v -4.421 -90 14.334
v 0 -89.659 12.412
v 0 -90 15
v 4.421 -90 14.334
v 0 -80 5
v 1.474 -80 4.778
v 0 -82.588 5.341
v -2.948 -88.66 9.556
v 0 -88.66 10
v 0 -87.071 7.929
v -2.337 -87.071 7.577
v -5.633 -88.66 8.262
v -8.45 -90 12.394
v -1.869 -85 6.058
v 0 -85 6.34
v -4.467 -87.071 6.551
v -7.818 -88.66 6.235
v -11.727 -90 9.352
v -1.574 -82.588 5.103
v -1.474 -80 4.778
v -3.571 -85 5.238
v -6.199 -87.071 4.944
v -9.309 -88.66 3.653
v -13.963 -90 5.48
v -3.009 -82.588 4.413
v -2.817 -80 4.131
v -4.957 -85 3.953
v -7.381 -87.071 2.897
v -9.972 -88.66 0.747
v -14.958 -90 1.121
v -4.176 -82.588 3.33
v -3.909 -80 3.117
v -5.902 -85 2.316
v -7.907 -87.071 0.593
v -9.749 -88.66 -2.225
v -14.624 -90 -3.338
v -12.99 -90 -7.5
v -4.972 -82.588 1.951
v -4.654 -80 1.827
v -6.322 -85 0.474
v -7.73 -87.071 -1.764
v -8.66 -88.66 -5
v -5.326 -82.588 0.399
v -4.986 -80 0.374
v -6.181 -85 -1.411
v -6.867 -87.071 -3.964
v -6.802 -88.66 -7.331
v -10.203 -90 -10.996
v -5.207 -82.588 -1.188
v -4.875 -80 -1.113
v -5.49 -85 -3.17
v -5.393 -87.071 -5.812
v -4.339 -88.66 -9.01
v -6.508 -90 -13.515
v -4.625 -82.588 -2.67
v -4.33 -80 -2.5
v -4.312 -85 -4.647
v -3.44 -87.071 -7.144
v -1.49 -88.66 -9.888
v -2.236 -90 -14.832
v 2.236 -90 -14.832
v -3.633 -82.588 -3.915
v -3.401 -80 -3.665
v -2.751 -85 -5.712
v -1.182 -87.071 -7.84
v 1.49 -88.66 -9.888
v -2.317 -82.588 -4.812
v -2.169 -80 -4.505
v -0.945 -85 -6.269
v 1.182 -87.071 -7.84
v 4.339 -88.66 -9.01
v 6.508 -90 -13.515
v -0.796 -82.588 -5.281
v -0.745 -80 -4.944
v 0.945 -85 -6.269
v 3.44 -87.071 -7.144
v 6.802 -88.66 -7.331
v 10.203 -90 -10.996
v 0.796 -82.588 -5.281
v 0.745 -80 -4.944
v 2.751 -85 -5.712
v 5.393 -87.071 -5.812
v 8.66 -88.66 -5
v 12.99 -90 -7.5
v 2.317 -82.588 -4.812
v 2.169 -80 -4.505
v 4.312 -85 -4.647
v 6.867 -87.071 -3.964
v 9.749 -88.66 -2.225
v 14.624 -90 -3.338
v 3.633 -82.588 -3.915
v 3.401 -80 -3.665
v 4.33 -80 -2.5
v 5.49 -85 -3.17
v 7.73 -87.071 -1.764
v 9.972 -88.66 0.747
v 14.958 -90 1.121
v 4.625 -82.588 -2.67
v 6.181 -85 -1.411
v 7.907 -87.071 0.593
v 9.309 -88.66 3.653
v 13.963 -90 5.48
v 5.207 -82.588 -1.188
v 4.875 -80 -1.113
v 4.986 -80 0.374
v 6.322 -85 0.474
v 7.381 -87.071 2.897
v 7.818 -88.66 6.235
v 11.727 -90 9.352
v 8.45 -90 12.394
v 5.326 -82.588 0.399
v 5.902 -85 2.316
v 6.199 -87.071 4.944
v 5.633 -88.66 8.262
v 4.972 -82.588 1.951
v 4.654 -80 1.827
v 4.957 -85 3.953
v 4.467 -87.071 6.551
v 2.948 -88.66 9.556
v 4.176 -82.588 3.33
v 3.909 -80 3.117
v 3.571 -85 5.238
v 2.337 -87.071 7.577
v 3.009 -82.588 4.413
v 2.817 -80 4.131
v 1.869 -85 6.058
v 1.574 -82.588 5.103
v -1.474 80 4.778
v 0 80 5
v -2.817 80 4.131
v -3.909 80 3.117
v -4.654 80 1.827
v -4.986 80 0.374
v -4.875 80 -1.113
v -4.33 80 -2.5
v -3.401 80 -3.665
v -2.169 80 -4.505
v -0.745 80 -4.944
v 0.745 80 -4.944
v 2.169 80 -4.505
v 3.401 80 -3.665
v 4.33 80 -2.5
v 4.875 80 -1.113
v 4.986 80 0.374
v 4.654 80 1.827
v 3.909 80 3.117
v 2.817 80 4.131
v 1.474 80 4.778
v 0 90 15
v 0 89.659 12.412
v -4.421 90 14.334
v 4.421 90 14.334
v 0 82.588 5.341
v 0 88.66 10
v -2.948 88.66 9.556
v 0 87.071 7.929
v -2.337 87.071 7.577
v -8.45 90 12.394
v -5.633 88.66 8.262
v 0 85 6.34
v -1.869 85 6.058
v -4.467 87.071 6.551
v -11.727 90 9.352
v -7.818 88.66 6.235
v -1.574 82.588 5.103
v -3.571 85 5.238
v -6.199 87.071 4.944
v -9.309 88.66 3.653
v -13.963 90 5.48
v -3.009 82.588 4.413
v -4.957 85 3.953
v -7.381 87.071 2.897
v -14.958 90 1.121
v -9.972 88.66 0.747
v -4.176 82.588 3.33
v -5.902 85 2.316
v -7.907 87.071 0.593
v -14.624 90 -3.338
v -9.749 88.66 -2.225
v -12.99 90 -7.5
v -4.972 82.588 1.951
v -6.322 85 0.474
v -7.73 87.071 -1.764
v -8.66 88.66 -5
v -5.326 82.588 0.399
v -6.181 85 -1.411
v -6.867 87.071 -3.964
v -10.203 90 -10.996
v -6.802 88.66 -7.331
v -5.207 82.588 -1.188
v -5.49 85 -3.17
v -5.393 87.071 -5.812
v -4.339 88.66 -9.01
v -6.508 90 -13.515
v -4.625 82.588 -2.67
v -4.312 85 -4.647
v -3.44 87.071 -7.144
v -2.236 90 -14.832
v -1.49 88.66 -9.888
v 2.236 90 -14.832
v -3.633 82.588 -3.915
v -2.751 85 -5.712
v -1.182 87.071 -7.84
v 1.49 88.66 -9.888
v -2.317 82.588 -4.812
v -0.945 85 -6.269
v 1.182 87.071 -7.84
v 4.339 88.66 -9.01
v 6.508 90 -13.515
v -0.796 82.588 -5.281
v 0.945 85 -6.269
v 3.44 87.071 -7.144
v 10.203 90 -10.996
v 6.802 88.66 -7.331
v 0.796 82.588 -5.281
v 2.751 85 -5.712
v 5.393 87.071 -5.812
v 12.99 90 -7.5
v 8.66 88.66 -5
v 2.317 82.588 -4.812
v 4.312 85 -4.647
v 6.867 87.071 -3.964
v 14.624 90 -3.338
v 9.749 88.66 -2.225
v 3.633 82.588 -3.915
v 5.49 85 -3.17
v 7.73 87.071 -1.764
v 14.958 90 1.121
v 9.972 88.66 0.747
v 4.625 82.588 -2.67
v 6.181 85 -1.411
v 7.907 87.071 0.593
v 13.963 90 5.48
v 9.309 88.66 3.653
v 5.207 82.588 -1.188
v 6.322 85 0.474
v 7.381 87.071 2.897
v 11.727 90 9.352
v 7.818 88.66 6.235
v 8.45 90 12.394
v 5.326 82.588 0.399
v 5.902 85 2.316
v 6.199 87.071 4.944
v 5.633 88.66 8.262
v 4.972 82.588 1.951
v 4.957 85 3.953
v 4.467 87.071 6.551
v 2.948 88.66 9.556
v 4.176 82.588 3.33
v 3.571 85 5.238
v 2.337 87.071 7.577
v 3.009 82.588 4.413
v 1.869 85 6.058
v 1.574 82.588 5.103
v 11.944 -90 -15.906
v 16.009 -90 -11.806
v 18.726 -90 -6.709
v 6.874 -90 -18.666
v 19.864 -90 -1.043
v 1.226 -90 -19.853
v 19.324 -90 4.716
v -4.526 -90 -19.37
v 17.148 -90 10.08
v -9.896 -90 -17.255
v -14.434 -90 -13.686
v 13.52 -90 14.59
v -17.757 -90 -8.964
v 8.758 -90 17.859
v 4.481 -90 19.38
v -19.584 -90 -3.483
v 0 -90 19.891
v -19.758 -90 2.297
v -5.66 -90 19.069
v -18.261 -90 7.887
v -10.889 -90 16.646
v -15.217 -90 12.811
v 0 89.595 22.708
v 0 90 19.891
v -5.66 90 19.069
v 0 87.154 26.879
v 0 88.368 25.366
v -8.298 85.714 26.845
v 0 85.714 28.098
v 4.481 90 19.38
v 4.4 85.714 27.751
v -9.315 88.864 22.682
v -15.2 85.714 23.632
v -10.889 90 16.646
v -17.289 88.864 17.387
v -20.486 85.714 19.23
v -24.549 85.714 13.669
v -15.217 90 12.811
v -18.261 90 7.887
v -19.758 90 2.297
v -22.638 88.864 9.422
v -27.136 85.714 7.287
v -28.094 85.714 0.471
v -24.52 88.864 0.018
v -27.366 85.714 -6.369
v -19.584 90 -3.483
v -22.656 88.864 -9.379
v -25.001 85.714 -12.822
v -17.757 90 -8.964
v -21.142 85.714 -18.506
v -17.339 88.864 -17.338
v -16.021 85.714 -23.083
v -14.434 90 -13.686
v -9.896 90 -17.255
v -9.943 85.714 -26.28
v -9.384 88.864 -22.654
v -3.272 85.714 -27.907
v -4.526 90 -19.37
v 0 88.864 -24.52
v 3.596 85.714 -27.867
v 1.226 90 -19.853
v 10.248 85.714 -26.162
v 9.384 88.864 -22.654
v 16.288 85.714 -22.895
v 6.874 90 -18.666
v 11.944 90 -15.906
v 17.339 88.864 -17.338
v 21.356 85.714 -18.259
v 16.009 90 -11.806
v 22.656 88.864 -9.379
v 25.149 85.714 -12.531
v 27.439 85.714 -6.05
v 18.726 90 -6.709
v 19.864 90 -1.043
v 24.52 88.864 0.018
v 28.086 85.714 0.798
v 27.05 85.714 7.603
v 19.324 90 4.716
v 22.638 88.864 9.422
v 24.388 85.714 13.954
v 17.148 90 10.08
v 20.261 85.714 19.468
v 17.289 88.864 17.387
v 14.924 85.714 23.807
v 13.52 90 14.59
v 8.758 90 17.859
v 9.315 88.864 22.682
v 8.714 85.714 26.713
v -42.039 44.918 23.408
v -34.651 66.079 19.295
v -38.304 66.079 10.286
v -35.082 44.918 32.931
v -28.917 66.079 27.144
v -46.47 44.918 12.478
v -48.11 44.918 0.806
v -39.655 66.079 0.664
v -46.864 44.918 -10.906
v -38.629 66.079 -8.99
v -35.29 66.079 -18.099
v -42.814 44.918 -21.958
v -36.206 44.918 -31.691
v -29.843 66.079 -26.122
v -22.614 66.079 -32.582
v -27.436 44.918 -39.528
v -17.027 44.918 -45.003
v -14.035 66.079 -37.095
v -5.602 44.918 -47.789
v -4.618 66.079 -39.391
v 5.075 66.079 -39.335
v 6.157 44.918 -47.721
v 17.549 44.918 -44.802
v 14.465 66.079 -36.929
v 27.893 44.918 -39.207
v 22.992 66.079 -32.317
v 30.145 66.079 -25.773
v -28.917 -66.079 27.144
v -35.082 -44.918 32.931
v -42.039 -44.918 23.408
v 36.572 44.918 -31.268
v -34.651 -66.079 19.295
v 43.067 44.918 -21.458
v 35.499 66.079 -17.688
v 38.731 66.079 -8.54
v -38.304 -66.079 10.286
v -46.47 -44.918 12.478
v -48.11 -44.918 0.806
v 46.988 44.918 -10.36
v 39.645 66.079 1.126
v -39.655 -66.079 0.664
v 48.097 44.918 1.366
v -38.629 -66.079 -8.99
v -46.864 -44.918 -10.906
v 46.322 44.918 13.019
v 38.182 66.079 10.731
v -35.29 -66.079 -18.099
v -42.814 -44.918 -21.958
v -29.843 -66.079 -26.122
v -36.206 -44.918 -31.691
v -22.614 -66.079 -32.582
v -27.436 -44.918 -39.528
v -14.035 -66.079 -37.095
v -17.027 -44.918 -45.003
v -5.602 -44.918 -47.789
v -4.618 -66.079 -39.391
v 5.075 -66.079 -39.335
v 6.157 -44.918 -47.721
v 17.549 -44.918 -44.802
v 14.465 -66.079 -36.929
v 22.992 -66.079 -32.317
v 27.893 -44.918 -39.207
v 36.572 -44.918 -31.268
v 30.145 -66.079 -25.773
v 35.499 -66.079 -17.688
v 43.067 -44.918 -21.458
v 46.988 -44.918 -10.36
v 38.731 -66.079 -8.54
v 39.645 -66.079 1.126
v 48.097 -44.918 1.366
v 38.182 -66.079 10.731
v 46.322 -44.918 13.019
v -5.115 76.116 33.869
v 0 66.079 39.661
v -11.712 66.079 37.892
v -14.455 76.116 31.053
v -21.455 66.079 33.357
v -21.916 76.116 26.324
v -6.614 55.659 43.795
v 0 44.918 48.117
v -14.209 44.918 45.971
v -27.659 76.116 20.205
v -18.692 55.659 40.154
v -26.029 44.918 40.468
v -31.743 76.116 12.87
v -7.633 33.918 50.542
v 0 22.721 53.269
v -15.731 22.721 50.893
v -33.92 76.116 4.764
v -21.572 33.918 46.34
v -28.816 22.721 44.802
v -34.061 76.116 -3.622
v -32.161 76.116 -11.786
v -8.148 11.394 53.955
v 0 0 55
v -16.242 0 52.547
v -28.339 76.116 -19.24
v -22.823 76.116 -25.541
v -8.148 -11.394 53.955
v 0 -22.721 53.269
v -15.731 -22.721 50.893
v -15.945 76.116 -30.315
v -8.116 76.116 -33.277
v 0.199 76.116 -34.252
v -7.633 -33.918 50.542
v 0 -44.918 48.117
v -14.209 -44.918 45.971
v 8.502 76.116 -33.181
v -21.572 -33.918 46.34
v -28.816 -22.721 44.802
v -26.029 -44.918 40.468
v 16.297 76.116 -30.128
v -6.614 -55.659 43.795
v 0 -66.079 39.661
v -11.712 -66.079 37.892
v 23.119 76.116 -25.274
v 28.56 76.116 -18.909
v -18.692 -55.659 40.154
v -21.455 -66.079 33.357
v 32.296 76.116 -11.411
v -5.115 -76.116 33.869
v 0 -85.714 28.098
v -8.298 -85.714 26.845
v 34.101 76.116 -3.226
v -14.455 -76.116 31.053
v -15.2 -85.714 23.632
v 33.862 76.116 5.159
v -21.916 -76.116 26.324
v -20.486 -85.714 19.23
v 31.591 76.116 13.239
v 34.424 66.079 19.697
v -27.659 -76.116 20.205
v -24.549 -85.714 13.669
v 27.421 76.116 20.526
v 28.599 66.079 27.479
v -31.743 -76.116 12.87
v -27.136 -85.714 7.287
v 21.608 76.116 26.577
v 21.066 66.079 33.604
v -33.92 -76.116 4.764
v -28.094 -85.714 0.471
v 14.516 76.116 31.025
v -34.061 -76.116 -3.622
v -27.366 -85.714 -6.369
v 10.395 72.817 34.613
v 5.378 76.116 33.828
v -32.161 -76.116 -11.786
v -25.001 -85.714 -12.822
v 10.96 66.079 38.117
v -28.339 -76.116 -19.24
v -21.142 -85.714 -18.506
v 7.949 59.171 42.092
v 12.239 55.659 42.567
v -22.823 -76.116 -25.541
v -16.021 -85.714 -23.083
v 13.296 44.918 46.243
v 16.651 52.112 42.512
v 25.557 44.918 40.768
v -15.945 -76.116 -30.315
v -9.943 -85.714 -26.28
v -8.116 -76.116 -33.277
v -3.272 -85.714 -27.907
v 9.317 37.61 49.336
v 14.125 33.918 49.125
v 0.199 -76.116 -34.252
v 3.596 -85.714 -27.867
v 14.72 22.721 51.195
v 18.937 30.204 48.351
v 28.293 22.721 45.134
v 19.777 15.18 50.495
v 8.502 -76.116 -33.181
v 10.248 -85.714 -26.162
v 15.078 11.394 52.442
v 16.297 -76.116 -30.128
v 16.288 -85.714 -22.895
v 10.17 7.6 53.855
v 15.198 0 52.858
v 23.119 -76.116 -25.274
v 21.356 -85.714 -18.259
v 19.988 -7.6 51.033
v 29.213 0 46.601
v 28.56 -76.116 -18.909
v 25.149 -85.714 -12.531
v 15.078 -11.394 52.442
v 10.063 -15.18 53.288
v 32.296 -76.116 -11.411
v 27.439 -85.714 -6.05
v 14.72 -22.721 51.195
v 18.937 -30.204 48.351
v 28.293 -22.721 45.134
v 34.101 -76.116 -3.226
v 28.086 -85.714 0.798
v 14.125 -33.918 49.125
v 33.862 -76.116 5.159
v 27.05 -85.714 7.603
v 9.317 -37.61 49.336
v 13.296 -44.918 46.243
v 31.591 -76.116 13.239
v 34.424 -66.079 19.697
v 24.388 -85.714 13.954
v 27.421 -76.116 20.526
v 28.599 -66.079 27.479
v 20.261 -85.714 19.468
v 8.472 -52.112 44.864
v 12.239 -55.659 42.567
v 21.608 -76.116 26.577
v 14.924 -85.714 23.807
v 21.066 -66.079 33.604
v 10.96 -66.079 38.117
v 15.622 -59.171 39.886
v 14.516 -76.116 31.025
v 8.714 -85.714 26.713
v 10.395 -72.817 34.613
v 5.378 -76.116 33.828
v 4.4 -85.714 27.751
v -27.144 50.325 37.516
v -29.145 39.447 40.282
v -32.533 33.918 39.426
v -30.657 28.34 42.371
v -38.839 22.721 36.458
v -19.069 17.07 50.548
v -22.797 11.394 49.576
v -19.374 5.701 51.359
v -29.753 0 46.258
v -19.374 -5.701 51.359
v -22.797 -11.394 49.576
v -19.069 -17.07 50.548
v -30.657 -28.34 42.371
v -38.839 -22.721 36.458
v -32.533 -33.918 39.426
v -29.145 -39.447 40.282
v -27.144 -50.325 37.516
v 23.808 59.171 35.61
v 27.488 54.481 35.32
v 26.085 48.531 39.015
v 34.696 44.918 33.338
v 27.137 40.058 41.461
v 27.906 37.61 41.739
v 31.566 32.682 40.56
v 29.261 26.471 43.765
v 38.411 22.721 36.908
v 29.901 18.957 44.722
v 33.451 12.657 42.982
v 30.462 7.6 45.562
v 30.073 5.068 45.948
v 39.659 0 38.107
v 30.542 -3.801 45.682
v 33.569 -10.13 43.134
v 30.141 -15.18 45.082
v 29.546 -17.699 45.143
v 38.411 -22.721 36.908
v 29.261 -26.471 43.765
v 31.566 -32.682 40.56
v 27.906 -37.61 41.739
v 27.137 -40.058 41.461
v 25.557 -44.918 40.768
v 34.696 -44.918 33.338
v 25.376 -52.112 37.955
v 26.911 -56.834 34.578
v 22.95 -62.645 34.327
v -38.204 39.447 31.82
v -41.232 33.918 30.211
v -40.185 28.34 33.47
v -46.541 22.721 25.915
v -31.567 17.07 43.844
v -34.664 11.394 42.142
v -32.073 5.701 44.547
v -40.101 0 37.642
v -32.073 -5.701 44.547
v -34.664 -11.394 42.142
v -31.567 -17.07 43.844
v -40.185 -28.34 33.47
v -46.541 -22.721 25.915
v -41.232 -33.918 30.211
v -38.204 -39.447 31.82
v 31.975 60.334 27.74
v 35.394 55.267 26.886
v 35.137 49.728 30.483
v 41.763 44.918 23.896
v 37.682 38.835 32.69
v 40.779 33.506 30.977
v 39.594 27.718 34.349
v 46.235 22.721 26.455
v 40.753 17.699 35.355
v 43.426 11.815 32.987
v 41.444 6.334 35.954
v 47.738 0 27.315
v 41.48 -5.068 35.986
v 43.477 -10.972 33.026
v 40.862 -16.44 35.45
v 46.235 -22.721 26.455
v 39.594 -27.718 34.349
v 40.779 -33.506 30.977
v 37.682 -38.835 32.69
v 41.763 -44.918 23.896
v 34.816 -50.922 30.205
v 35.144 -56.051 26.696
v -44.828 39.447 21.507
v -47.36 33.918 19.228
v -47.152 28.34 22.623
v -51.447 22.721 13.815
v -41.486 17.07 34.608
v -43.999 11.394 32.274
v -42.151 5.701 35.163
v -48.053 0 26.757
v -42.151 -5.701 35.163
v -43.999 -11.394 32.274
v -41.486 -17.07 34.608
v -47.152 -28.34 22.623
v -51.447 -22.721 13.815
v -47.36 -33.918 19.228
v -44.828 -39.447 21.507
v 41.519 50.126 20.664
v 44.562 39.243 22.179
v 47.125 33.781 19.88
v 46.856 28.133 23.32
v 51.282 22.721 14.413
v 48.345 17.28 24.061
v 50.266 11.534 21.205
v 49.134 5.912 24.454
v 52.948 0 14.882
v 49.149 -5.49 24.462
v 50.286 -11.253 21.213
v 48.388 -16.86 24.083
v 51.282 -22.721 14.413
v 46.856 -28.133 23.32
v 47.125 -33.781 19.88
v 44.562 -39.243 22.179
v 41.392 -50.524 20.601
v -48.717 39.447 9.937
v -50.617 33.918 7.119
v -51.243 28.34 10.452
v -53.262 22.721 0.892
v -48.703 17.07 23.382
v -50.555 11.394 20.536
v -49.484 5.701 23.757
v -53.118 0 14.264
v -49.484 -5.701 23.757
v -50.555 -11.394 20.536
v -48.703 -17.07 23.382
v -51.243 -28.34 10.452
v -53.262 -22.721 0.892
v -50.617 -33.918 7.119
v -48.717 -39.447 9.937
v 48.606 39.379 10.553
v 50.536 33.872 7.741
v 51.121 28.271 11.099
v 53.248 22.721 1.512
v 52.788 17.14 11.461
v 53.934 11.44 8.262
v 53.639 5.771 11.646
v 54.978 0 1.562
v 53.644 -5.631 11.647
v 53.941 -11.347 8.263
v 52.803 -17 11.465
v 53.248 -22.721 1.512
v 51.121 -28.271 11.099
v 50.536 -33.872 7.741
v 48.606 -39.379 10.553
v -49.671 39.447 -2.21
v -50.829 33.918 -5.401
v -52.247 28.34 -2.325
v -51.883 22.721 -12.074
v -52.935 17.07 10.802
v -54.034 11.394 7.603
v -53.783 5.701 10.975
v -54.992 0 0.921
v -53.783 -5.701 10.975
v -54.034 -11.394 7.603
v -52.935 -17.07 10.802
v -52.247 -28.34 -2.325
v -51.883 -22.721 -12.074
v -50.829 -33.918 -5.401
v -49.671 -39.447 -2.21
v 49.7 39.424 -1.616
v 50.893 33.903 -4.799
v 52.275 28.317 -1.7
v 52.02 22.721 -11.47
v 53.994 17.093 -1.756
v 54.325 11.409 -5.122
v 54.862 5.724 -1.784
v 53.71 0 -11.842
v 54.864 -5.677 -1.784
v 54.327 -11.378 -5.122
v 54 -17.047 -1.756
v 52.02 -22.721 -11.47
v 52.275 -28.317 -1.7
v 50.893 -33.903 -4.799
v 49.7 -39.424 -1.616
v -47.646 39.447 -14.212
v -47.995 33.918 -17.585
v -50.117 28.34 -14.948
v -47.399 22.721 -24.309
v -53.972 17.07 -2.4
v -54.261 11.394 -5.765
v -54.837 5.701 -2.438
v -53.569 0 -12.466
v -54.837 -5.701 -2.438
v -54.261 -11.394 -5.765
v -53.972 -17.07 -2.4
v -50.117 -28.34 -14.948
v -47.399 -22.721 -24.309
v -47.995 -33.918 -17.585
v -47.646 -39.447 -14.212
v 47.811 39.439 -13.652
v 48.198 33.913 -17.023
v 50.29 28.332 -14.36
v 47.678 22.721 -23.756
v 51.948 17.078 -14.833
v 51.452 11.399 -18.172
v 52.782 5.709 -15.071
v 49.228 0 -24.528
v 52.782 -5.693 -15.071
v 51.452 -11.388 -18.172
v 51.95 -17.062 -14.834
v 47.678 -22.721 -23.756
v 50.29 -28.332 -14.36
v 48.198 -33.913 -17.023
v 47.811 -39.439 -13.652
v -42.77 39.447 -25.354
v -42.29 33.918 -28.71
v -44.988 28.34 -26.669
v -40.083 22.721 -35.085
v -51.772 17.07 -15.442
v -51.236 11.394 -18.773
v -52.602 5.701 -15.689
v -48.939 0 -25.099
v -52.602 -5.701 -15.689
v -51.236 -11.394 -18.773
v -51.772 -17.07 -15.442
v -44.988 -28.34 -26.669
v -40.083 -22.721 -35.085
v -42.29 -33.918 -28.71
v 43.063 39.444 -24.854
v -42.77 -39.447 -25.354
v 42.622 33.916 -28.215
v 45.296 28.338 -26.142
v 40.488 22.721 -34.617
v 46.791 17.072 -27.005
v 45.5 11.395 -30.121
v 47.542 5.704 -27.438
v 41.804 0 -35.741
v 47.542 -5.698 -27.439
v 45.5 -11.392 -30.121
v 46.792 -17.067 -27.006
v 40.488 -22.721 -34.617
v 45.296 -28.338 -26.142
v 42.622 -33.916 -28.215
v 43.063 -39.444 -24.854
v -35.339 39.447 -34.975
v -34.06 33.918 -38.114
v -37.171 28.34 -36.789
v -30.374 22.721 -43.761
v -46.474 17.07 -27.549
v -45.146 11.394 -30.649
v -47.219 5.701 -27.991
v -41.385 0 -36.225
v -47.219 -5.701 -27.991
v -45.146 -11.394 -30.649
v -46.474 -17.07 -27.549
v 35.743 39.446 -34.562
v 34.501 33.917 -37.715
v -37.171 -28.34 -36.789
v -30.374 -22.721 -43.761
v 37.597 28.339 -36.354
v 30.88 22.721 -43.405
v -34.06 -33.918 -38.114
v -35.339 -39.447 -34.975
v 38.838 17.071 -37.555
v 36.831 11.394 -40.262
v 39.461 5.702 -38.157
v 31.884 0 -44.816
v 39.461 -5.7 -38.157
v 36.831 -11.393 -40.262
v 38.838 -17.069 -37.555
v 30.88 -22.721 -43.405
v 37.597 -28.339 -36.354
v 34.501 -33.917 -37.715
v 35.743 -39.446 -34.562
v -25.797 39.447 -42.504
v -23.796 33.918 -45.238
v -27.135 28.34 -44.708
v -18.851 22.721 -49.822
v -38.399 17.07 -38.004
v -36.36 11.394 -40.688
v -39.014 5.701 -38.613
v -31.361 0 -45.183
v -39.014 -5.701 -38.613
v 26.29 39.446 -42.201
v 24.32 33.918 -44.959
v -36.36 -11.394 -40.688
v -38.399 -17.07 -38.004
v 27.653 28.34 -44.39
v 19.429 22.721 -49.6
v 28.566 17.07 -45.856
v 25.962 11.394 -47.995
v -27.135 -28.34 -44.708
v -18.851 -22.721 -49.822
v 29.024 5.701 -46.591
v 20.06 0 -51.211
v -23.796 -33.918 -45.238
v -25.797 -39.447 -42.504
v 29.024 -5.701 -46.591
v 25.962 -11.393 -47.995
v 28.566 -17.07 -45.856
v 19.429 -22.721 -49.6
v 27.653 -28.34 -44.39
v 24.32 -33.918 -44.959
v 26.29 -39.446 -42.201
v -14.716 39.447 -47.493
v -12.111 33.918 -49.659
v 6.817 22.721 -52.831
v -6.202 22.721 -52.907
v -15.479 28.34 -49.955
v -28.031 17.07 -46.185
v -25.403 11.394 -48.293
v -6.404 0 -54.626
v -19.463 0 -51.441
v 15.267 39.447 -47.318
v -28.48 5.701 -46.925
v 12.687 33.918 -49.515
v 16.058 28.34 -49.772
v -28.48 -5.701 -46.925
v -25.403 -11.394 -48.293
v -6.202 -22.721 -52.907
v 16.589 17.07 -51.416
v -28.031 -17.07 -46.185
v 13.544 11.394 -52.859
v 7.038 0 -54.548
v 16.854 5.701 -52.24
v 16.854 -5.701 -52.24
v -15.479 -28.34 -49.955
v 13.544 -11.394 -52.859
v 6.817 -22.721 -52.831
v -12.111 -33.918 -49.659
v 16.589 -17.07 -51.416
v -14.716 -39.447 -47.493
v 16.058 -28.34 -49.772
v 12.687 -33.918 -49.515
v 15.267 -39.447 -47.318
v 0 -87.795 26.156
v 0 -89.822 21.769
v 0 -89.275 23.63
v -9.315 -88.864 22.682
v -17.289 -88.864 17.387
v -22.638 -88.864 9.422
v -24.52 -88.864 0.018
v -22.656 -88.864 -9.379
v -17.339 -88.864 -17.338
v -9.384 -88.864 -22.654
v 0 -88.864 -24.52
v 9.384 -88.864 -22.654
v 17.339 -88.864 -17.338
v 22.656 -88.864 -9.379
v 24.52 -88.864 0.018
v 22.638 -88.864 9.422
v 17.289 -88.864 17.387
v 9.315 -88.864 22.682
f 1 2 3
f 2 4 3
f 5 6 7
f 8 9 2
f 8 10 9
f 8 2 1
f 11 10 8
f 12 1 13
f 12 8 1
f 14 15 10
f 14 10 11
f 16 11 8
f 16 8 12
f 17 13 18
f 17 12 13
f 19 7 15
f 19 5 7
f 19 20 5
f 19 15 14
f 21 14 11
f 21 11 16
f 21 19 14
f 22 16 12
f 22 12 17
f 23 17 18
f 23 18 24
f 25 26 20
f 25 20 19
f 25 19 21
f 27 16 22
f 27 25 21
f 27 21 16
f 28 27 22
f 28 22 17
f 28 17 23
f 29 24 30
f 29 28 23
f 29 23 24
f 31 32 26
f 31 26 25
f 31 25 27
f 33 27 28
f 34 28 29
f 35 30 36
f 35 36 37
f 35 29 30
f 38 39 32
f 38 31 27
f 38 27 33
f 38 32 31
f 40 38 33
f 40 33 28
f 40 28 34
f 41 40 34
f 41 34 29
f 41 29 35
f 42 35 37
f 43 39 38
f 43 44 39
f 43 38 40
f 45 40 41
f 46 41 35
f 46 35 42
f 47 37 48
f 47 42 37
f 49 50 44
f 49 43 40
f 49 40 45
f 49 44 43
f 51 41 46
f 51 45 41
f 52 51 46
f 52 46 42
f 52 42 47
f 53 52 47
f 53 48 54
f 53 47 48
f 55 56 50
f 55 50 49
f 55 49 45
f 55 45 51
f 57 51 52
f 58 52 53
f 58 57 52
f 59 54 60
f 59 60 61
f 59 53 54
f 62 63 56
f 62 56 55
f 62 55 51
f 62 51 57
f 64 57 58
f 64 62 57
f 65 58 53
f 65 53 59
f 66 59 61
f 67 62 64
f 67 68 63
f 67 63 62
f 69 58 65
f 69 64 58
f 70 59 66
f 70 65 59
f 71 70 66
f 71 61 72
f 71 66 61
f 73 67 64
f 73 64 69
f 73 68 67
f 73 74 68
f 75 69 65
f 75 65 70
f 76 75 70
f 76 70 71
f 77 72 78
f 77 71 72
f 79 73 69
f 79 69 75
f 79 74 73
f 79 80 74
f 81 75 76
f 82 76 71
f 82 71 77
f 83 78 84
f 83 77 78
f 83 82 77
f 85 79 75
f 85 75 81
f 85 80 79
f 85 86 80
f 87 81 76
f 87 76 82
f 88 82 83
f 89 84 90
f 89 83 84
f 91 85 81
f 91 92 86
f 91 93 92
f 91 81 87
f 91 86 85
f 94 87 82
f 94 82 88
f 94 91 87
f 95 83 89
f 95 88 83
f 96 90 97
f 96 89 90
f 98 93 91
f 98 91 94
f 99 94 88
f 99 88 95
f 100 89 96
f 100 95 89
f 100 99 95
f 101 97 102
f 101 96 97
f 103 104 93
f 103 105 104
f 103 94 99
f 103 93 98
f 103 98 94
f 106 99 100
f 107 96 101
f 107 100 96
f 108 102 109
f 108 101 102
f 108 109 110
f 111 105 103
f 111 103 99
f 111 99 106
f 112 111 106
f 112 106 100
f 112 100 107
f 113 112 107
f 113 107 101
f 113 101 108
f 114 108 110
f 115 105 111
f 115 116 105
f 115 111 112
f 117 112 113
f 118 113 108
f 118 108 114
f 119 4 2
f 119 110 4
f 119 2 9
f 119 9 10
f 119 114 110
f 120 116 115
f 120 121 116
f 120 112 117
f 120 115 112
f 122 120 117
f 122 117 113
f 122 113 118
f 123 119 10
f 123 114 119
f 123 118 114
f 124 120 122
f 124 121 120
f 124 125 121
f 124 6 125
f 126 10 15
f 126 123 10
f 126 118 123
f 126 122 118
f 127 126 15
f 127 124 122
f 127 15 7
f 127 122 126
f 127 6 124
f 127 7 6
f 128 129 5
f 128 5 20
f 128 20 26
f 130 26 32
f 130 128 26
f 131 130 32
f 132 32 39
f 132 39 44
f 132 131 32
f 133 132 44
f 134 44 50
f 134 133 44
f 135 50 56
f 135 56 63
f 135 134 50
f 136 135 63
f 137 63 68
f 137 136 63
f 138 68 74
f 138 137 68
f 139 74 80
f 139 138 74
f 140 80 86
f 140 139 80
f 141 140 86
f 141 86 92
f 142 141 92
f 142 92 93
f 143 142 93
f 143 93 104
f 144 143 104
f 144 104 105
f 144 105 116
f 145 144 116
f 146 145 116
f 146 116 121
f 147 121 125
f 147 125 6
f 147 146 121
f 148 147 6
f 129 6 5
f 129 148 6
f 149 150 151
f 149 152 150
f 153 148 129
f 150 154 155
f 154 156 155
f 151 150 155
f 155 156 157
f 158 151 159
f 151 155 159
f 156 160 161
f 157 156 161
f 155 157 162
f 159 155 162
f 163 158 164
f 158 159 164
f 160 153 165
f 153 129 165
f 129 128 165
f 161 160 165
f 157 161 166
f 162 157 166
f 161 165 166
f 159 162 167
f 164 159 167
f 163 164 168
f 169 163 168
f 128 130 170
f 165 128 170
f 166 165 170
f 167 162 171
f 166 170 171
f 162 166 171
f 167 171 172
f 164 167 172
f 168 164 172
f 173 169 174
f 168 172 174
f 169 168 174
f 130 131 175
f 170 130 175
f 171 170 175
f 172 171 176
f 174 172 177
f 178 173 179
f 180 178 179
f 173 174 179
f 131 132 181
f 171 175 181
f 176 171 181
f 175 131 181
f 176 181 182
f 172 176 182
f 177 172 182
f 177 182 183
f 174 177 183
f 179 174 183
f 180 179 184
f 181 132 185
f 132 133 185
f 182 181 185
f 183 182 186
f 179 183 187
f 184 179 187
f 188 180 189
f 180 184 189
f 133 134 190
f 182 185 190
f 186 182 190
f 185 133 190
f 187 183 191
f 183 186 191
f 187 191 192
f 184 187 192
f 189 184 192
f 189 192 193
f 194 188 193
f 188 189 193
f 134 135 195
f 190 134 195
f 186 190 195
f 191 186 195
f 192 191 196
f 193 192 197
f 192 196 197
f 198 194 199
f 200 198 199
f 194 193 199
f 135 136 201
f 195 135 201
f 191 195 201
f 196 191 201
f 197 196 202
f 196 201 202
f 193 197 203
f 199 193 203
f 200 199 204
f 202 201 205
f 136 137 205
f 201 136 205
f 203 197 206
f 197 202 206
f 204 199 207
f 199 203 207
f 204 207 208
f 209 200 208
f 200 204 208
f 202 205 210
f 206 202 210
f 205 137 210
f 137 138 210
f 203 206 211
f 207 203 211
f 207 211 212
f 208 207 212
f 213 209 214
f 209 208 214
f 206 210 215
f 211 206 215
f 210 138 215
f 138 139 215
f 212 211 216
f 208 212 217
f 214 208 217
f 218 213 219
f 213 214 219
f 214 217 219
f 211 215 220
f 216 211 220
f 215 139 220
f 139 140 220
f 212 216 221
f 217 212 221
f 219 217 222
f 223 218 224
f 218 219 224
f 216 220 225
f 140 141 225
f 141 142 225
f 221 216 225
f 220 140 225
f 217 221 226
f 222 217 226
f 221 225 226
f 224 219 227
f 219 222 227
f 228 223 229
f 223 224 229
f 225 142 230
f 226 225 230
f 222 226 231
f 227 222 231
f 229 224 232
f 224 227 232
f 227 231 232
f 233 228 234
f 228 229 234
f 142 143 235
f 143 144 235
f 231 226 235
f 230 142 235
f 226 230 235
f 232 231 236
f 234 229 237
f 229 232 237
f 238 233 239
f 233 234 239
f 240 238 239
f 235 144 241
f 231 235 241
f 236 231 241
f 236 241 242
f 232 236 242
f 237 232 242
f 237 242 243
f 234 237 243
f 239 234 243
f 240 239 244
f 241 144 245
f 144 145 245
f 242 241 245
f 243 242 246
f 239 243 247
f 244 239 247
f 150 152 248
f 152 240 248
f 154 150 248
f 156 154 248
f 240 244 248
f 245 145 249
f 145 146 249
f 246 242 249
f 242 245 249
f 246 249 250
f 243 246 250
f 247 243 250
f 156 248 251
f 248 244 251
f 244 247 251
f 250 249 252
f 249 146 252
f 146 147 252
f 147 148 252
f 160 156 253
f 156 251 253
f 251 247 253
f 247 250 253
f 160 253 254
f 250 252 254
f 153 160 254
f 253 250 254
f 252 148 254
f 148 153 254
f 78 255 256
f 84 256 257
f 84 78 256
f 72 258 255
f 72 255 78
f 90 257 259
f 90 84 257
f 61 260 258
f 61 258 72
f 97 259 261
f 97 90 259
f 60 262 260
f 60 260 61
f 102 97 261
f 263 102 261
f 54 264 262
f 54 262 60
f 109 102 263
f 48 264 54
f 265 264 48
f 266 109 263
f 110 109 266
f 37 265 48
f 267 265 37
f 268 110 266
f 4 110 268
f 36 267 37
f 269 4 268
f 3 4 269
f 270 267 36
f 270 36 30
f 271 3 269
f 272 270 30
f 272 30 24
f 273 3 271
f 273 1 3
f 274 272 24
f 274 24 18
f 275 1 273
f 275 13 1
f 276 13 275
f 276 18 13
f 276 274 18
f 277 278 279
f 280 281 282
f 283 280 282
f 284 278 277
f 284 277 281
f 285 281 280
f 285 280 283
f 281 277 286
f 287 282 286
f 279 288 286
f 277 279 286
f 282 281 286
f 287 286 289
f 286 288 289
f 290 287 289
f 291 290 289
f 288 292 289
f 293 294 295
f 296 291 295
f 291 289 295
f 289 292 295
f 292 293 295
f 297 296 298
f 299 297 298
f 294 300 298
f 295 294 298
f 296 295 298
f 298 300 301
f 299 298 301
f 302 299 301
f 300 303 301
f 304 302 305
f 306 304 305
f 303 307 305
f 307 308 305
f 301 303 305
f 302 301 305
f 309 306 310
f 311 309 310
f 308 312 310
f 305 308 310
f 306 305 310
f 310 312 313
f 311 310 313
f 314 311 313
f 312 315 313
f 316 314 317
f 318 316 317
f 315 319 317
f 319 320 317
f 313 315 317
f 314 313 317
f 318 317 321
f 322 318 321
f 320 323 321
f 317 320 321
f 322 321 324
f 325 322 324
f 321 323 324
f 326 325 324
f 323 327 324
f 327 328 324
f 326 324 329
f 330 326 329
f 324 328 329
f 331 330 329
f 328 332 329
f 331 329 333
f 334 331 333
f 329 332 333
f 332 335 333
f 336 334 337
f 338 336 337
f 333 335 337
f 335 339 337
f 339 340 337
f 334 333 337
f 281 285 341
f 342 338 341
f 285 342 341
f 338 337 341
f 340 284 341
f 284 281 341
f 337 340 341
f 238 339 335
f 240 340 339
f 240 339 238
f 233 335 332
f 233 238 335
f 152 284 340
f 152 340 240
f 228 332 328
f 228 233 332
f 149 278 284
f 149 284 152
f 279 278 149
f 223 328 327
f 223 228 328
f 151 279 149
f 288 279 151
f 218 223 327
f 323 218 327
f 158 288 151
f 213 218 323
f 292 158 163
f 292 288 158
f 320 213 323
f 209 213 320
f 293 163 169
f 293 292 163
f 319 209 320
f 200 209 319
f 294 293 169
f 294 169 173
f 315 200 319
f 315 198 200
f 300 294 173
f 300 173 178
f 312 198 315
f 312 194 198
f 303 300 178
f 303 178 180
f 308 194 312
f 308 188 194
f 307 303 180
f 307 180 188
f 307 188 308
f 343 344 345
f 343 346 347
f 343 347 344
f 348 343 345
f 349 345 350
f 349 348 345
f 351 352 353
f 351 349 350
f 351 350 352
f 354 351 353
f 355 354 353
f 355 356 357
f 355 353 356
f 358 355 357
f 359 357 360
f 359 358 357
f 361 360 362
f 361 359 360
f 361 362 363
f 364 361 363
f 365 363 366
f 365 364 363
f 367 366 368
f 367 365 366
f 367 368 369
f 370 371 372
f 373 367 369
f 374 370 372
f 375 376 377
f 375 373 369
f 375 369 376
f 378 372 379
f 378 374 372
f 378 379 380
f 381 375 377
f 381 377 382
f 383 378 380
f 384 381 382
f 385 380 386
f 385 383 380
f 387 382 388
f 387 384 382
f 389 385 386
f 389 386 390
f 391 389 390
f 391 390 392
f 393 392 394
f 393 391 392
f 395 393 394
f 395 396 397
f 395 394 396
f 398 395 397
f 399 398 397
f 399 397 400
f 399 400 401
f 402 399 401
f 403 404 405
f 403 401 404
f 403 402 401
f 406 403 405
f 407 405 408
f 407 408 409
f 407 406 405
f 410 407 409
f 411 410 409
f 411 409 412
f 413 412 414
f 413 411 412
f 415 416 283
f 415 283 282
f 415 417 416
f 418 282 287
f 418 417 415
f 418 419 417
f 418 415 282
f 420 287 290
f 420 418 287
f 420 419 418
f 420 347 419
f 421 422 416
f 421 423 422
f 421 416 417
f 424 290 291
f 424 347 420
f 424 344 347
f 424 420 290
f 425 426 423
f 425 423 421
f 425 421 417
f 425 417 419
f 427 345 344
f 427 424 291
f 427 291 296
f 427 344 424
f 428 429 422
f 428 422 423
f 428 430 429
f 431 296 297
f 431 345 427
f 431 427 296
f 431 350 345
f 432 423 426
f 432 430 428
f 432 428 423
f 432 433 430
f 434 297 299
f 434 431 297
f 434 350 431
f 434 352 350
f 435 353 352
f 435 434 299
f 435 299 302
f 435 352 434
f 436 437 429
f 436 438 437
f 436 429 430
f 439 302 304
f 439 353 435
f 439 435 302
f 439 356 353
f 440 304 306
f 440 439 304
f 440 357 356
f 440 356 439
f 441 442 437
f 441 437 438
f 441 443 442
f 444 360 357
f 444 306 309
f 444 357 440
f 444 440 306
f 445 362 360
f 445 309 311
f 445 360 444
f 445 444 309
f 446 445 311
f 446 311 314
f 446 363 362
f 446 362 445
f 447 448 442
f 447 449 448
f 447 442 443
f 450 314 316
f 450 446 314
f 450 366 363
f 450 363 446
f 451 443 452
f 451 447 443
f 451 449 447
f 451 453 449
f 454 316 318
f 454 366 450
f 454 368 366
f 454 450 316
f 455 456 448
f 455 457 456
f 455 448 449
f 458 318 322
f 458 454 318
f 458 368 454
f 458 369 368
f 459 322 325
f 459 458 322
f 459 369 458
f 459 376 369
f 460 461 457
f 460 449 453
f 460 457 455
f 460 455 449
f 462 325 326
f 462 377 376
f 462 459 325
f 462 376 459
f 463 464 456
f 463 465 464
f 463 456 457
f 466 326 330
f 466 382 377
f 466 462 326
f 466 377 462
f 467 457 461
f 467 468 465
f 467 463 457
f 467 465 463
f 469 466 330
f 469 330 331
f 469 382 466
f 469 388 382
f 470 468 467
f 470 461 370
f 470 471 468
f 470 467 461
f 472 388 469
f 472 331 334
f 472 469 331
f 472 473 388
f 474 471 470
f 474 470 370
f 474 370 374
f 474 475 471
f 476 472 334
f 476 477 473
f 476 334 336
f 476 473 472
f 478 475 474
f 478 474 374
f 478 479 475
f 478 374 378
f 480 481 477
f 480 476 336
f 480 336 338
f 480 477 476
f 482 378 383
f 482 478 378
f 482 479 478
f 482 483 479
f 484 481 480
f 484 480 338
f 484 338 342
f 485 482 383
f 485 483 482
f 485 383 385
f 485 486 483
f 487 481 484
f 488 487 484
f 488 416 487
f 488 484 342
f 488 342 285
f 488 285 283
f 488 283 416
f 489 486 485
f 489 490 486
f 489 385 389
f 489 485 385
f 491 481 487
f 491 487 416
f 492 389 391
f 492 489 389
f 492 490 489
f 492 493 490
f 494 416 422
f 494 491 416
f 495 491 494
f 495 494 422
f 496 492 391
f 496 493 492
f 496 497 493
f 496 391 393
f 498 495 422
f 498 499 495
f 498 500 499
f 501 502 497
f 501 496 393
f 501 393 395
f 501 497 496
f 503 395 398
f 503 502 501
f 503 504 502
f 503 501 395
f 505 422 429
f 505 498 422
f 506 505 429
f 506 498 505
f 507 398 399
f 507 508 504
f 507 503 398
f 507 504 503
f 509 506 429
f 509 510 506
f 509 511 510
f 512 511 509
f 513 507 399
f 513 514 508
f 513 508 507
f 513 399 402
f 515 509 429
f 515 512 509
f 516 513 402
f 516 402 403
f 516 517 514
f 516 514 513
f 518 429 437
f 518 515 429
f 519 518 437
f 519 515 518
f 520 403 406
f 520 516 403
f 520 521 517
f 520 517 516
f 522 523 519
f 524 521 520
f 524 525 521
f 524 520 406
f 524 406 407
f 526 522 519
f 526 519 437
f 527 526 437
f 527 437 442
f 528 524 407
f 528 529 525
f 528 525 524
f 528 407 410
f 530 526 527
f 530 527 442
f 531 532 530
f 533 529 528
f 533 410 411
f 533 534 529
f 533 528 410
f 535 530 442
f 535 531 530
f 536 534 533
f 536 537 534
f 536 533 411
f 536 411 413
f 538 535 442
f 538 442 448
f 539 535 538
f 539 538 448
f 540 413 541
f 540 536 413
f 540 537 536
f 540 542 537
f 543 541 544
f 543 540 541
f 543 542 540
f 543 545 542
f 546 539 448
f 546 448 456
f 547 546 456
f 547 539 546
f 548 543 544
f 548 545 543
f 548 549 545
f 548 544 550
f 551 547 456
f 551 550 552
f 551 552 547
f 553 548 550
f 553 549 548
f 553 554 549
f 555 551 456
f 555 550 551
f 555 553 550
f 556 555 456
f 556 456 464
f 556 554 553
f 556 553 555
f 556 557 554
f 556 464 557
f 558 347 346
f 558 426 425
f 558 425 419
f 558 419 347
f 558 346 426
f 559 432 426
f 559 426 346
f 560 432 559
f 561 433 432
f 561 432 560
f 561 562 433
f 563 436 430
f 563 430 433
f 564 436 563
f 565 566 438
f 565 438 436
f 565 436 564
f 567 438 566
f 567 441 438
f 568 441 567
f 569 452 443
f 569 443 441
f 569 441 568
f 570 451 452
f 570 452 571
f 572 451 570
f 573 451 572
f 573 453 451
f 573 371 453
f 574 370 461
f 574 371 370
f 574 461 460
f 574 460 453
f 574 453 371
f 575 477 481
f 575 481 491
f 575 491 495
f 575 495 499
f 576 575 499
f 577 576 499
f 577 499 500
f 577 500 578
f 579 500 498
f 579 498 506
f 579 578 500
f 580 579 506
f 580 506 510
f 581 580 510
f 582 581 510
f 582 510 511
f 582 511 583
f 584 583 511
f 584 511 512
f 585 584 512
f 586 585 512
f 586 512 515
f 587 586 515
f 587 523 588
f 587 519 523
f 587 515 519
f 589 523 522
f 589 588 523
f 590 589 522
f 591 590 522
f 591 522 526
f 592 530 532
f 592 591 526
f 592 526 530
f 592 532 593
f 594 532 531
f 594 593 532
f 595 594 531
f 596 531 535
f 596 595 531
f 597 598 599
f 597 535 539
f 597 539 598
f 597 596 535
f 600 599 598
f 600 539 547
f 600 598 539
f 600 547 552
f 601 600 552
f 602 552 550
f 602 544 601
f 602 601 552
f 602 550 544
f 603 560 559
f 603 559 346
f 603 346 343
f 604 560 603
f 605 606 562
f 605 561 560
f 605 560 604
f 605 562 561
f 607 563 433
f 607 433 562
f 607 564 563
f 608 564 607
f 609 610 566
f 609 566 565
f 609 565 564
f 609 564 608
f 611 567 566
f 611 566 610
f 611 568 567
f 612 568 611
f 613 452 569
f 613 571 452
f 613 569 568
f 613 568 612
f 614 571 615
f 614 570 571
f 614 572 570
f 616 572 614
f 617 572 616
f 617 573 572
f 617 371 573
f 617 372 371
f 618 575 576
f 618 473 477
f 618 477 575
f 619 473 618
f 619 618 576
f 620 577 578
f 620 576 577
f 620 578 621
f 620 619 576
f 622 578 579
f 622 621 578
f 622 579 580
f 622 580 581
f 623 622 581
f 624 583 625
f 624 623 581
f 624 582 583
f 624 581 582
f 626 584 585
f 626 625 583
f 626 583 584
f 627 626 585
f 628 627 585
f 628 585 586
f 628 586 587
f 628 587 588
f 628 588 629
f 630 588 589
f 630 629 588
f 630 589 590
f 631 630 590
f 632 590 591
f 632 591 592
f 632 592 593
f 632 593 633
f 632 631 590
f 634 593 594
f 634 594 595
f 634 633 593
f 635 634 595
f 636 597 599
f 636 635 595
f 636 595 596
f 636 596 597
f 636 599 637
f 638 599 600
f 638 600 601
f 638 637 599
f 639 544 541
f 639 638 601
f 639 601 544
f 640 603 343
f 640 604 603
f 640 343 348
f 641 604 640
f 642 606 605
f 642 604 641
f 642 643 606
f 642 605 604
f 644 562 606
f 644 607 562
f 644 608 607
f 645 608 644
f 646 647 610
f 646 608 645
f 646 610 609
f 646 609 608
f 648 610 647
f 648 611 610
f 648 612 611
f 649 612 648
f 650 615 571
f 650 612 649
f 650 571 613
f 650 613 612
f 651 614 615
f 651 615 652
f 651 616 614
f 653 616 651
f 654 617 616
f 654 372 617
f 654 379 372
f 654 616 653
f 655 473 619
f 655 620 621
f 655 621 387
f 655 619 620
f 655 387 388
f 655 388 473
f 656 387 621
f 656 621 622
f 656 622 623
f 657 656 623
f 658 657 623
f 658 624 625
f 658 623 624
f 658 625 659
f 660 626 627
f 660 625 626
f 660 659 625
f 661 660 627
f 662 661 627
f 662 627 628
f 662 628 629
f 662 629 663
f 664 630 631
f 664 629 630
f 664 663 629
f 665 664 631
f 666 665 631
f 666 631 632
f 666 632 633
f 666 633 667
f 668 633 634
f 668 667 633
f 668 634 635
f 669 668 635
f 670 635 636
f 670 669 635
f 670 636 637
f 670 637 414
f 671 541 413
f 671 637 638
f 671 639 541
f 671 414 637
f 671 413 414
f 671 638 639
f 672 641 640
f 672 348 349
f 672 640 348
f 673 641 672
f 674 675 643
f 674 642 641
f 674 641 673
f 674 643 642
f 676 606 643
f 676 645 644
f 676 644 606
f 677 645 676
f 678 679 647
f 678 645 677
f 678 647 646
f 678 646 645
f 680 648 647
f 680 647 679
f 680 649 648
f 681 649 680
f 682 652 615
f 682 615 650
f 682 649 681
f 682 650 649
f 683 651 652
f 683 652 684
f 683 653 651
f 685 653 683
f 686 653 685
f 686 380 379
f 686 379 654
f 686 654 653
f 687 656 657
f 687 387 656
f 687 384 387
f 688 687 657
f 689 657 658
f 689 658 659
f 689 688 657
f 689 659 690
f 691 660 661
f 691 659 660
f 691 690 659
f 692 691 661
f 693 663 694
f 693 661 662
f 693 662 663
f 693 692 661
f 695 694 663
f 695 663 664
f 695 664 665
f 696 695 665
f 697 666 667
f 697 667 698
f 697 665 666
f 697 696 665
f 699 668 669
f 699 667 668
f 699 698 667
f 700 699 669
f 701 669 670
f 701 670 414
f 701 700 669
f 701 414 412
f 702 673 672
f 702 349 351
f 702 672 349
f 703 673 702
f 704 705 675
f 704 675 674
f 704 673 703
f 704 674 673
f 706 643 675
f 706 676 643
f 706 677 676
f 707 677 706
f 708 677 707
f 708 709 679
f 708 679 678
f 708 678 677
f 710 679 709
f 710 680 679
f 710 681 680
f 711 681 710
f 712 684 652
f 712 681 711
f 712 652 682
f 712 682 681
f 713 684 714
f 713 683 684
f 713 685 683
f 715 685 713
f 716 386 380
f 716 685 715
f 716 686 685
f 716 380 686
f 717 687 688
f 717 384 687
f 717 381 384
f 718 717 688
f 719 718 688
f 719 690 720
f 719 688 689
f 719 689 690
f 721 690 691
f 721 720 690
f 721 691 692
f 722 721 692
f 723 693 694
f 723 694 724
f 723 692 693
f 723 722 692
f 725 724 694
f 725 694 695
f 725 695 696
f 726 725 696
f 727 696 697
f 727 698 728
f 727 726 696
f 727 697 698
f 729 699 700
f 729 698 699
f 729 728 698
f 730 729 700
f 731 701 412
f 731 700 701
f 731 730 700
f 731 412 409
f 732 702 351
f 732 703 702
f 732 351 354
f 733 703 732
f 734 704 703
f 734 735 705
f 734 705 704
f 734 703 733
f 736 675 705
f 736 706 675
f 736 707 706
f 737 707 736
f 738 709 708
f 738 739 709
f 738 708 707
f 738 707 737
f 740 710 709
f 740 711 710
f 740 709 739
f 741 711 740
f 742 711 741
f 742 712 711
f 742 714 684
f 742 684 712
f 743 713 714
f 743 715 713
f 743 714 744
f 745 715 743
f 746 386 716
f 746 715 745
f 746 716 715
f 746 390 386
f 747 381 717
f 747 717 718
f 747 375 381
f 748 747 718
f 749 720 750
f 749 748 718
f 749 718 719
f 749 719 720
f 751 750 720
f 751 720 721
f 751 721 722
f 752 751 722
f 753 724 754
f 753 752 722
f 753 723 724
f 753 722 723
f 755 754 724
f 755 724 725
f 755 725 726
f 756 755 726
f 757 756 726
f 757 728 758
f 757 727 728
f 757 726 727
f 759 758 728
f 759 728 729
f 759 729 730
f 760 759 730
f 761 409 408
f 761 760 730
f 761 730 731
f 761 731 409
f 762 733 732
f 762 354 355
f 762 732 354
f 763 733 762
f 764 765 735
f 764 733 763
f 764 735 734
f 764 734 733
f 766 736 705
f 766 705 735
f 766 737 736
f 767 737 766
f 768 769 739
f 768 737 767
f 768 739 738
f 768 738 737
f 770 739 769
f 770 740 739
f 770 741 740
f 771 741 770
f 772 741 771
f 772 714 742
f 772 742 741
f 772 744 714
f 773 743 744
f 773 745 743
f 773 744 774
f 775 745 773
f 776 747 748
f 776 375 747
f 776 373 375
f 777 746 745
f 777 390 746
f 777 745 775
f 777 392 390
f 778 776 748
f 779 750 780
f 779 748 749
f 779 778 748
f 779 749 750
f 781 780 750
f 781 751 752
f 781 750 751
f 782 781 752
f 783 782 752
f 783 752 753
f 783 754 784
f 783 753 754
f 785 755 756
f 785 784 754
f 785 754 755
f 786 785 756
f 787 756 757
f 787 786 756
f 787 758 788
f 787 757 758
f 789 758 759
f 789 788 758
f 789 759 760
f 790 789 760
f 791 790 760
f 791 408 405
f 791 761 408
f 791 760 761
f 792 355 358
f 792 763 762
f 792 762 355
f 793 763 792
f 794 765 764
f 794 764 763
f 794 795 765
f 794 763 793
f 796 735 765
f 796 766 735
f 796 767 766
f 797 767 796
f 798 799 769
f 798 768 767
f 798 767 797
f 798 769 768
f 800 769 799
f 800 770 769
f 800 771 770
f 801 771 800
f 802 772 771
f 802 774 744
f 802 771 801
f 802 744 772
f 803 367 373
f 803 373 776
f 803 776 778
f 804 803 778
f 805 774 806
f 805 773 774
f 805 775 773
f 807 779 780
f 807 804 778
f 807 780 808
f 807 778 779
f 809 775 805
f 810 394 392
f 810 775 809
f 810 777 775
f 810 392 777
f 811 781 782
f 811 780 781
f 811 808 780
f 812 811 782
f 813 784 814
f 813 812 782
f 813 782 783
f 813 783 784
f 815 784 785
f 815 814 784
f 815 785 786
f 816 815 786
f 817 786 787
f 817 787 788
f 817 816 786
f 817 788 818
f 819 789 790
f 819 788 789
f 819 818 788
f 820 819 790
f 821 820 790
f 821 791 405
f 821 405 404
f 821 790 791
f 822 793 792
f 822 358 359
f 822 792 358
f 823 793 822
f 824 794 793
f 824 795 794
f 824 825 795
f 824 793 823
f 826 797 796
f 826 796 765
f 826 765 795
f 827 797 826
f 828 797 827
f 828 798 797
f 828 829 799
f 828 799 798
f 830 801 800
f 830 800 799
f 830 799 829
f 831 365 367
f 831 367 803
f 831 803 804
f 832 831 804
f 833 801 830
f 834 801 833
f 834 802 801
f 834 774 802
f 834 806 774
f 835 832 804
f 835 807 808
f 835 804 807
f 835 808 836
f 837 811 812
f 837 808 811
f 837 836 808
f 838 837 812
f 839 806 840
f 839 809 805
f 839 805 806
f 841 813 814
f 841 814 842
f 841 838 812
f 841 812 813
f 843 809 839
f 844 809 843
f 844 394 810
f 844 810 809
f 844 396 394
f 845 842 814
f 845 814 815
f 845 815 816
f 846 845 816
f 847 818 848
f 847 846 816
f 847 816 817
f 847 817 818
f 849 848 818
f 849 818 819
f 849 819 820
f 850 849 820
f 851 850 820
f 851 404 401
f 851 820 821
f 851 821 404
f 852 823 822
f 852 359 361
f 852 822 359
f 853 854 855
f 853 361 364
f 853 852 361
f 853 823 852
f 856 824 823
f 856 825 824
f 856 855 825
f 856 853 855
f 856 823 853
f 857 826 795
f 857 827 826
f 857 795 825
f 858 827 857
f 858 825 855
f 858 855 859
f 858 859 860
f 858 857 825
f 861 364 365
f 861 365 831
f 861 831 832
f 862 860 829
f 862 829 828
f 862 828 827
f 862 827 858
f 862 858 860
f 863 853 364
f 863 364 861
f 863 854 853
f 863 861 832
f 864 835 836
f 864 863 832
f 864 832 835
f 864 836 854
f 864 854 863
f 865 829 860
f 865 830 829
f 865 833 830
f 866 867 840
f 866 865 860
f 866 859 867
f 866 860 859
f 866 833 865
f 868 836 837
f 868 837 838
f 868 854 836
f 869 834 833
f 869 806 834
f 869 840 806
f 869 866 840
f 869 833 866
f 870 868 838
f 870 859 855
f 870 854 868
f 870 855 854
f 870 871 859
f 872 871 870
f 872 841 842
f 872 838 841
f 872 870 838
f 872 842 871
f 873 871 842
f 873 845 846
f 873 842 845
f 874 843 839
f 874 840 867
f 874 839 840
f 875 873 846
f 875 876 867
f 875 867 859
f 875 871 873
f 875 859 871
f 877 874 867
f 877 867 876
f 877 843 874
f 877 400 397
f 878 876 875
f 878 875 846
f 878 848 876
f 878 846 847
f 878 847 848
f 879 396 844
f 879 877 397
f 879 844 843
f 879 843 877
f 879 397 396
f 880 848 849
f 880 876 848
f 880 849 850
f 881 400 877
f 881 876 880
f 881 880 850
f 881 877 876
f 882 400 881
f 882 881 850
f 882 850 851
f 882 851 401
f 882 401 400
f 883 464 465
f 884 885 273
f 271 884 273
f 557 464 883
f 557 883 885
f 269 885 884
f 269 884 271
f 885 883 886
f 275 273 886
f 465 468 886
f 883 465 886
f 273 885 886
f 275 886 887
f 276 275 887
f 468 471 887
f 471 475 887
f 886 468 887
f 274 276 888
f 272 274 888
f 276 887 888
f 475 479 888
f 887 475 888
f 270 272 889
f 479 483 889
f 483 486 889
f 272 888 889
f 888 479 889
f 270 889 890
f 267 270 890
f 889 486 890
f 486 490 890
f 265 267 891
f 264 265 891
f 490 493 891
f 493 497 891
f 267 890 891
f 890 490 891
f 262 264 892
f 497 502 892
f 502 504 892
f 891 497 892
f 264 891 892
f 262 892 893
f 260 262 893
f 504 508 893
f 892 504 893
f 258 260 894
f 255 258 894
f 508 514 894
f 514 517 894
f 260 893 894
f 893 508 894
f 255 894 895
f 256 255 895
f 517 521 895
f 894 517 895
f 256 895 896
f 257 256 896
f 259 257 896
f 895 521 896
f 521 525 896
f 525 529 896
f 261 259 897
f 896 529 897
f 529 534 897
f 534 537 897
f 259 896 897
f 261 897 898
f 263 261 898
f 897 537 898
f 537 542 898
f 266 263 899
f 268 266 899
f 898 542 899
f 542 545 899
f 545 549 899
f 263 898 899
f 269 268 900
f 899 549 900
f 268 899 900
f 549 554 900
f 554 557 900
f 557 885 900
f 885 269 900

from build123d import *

# Parameters (mm, degrees)
F3_R = 10


with BuildPart() as f2:
    # F0 (on Right) → F2 (revolve)
    with BuildSketch(Plane.YZ):
        with BuildLine():
            Line((90, 5), (90, 25))
            ThreePointArc((90, 25), (0, 55), (-90, 25))
            Line((-90, 25), (-90, 5))
            Line((-90, 5), (90, 5))
        make_face()
    revolve(axis=Axis((0, -40.525872, 0), (0, -1, 0)))

    # F3
    f3_edges = [f2.edges().sort_by_distance(p)[0] for p in [
        (0, -90, -25),
        (0, -90, -5),
        (0, 90, -5),
        (0, 90, -25),
    ]]
    fillet(f3_edges, radius=F3_R)


solid = f2.part
